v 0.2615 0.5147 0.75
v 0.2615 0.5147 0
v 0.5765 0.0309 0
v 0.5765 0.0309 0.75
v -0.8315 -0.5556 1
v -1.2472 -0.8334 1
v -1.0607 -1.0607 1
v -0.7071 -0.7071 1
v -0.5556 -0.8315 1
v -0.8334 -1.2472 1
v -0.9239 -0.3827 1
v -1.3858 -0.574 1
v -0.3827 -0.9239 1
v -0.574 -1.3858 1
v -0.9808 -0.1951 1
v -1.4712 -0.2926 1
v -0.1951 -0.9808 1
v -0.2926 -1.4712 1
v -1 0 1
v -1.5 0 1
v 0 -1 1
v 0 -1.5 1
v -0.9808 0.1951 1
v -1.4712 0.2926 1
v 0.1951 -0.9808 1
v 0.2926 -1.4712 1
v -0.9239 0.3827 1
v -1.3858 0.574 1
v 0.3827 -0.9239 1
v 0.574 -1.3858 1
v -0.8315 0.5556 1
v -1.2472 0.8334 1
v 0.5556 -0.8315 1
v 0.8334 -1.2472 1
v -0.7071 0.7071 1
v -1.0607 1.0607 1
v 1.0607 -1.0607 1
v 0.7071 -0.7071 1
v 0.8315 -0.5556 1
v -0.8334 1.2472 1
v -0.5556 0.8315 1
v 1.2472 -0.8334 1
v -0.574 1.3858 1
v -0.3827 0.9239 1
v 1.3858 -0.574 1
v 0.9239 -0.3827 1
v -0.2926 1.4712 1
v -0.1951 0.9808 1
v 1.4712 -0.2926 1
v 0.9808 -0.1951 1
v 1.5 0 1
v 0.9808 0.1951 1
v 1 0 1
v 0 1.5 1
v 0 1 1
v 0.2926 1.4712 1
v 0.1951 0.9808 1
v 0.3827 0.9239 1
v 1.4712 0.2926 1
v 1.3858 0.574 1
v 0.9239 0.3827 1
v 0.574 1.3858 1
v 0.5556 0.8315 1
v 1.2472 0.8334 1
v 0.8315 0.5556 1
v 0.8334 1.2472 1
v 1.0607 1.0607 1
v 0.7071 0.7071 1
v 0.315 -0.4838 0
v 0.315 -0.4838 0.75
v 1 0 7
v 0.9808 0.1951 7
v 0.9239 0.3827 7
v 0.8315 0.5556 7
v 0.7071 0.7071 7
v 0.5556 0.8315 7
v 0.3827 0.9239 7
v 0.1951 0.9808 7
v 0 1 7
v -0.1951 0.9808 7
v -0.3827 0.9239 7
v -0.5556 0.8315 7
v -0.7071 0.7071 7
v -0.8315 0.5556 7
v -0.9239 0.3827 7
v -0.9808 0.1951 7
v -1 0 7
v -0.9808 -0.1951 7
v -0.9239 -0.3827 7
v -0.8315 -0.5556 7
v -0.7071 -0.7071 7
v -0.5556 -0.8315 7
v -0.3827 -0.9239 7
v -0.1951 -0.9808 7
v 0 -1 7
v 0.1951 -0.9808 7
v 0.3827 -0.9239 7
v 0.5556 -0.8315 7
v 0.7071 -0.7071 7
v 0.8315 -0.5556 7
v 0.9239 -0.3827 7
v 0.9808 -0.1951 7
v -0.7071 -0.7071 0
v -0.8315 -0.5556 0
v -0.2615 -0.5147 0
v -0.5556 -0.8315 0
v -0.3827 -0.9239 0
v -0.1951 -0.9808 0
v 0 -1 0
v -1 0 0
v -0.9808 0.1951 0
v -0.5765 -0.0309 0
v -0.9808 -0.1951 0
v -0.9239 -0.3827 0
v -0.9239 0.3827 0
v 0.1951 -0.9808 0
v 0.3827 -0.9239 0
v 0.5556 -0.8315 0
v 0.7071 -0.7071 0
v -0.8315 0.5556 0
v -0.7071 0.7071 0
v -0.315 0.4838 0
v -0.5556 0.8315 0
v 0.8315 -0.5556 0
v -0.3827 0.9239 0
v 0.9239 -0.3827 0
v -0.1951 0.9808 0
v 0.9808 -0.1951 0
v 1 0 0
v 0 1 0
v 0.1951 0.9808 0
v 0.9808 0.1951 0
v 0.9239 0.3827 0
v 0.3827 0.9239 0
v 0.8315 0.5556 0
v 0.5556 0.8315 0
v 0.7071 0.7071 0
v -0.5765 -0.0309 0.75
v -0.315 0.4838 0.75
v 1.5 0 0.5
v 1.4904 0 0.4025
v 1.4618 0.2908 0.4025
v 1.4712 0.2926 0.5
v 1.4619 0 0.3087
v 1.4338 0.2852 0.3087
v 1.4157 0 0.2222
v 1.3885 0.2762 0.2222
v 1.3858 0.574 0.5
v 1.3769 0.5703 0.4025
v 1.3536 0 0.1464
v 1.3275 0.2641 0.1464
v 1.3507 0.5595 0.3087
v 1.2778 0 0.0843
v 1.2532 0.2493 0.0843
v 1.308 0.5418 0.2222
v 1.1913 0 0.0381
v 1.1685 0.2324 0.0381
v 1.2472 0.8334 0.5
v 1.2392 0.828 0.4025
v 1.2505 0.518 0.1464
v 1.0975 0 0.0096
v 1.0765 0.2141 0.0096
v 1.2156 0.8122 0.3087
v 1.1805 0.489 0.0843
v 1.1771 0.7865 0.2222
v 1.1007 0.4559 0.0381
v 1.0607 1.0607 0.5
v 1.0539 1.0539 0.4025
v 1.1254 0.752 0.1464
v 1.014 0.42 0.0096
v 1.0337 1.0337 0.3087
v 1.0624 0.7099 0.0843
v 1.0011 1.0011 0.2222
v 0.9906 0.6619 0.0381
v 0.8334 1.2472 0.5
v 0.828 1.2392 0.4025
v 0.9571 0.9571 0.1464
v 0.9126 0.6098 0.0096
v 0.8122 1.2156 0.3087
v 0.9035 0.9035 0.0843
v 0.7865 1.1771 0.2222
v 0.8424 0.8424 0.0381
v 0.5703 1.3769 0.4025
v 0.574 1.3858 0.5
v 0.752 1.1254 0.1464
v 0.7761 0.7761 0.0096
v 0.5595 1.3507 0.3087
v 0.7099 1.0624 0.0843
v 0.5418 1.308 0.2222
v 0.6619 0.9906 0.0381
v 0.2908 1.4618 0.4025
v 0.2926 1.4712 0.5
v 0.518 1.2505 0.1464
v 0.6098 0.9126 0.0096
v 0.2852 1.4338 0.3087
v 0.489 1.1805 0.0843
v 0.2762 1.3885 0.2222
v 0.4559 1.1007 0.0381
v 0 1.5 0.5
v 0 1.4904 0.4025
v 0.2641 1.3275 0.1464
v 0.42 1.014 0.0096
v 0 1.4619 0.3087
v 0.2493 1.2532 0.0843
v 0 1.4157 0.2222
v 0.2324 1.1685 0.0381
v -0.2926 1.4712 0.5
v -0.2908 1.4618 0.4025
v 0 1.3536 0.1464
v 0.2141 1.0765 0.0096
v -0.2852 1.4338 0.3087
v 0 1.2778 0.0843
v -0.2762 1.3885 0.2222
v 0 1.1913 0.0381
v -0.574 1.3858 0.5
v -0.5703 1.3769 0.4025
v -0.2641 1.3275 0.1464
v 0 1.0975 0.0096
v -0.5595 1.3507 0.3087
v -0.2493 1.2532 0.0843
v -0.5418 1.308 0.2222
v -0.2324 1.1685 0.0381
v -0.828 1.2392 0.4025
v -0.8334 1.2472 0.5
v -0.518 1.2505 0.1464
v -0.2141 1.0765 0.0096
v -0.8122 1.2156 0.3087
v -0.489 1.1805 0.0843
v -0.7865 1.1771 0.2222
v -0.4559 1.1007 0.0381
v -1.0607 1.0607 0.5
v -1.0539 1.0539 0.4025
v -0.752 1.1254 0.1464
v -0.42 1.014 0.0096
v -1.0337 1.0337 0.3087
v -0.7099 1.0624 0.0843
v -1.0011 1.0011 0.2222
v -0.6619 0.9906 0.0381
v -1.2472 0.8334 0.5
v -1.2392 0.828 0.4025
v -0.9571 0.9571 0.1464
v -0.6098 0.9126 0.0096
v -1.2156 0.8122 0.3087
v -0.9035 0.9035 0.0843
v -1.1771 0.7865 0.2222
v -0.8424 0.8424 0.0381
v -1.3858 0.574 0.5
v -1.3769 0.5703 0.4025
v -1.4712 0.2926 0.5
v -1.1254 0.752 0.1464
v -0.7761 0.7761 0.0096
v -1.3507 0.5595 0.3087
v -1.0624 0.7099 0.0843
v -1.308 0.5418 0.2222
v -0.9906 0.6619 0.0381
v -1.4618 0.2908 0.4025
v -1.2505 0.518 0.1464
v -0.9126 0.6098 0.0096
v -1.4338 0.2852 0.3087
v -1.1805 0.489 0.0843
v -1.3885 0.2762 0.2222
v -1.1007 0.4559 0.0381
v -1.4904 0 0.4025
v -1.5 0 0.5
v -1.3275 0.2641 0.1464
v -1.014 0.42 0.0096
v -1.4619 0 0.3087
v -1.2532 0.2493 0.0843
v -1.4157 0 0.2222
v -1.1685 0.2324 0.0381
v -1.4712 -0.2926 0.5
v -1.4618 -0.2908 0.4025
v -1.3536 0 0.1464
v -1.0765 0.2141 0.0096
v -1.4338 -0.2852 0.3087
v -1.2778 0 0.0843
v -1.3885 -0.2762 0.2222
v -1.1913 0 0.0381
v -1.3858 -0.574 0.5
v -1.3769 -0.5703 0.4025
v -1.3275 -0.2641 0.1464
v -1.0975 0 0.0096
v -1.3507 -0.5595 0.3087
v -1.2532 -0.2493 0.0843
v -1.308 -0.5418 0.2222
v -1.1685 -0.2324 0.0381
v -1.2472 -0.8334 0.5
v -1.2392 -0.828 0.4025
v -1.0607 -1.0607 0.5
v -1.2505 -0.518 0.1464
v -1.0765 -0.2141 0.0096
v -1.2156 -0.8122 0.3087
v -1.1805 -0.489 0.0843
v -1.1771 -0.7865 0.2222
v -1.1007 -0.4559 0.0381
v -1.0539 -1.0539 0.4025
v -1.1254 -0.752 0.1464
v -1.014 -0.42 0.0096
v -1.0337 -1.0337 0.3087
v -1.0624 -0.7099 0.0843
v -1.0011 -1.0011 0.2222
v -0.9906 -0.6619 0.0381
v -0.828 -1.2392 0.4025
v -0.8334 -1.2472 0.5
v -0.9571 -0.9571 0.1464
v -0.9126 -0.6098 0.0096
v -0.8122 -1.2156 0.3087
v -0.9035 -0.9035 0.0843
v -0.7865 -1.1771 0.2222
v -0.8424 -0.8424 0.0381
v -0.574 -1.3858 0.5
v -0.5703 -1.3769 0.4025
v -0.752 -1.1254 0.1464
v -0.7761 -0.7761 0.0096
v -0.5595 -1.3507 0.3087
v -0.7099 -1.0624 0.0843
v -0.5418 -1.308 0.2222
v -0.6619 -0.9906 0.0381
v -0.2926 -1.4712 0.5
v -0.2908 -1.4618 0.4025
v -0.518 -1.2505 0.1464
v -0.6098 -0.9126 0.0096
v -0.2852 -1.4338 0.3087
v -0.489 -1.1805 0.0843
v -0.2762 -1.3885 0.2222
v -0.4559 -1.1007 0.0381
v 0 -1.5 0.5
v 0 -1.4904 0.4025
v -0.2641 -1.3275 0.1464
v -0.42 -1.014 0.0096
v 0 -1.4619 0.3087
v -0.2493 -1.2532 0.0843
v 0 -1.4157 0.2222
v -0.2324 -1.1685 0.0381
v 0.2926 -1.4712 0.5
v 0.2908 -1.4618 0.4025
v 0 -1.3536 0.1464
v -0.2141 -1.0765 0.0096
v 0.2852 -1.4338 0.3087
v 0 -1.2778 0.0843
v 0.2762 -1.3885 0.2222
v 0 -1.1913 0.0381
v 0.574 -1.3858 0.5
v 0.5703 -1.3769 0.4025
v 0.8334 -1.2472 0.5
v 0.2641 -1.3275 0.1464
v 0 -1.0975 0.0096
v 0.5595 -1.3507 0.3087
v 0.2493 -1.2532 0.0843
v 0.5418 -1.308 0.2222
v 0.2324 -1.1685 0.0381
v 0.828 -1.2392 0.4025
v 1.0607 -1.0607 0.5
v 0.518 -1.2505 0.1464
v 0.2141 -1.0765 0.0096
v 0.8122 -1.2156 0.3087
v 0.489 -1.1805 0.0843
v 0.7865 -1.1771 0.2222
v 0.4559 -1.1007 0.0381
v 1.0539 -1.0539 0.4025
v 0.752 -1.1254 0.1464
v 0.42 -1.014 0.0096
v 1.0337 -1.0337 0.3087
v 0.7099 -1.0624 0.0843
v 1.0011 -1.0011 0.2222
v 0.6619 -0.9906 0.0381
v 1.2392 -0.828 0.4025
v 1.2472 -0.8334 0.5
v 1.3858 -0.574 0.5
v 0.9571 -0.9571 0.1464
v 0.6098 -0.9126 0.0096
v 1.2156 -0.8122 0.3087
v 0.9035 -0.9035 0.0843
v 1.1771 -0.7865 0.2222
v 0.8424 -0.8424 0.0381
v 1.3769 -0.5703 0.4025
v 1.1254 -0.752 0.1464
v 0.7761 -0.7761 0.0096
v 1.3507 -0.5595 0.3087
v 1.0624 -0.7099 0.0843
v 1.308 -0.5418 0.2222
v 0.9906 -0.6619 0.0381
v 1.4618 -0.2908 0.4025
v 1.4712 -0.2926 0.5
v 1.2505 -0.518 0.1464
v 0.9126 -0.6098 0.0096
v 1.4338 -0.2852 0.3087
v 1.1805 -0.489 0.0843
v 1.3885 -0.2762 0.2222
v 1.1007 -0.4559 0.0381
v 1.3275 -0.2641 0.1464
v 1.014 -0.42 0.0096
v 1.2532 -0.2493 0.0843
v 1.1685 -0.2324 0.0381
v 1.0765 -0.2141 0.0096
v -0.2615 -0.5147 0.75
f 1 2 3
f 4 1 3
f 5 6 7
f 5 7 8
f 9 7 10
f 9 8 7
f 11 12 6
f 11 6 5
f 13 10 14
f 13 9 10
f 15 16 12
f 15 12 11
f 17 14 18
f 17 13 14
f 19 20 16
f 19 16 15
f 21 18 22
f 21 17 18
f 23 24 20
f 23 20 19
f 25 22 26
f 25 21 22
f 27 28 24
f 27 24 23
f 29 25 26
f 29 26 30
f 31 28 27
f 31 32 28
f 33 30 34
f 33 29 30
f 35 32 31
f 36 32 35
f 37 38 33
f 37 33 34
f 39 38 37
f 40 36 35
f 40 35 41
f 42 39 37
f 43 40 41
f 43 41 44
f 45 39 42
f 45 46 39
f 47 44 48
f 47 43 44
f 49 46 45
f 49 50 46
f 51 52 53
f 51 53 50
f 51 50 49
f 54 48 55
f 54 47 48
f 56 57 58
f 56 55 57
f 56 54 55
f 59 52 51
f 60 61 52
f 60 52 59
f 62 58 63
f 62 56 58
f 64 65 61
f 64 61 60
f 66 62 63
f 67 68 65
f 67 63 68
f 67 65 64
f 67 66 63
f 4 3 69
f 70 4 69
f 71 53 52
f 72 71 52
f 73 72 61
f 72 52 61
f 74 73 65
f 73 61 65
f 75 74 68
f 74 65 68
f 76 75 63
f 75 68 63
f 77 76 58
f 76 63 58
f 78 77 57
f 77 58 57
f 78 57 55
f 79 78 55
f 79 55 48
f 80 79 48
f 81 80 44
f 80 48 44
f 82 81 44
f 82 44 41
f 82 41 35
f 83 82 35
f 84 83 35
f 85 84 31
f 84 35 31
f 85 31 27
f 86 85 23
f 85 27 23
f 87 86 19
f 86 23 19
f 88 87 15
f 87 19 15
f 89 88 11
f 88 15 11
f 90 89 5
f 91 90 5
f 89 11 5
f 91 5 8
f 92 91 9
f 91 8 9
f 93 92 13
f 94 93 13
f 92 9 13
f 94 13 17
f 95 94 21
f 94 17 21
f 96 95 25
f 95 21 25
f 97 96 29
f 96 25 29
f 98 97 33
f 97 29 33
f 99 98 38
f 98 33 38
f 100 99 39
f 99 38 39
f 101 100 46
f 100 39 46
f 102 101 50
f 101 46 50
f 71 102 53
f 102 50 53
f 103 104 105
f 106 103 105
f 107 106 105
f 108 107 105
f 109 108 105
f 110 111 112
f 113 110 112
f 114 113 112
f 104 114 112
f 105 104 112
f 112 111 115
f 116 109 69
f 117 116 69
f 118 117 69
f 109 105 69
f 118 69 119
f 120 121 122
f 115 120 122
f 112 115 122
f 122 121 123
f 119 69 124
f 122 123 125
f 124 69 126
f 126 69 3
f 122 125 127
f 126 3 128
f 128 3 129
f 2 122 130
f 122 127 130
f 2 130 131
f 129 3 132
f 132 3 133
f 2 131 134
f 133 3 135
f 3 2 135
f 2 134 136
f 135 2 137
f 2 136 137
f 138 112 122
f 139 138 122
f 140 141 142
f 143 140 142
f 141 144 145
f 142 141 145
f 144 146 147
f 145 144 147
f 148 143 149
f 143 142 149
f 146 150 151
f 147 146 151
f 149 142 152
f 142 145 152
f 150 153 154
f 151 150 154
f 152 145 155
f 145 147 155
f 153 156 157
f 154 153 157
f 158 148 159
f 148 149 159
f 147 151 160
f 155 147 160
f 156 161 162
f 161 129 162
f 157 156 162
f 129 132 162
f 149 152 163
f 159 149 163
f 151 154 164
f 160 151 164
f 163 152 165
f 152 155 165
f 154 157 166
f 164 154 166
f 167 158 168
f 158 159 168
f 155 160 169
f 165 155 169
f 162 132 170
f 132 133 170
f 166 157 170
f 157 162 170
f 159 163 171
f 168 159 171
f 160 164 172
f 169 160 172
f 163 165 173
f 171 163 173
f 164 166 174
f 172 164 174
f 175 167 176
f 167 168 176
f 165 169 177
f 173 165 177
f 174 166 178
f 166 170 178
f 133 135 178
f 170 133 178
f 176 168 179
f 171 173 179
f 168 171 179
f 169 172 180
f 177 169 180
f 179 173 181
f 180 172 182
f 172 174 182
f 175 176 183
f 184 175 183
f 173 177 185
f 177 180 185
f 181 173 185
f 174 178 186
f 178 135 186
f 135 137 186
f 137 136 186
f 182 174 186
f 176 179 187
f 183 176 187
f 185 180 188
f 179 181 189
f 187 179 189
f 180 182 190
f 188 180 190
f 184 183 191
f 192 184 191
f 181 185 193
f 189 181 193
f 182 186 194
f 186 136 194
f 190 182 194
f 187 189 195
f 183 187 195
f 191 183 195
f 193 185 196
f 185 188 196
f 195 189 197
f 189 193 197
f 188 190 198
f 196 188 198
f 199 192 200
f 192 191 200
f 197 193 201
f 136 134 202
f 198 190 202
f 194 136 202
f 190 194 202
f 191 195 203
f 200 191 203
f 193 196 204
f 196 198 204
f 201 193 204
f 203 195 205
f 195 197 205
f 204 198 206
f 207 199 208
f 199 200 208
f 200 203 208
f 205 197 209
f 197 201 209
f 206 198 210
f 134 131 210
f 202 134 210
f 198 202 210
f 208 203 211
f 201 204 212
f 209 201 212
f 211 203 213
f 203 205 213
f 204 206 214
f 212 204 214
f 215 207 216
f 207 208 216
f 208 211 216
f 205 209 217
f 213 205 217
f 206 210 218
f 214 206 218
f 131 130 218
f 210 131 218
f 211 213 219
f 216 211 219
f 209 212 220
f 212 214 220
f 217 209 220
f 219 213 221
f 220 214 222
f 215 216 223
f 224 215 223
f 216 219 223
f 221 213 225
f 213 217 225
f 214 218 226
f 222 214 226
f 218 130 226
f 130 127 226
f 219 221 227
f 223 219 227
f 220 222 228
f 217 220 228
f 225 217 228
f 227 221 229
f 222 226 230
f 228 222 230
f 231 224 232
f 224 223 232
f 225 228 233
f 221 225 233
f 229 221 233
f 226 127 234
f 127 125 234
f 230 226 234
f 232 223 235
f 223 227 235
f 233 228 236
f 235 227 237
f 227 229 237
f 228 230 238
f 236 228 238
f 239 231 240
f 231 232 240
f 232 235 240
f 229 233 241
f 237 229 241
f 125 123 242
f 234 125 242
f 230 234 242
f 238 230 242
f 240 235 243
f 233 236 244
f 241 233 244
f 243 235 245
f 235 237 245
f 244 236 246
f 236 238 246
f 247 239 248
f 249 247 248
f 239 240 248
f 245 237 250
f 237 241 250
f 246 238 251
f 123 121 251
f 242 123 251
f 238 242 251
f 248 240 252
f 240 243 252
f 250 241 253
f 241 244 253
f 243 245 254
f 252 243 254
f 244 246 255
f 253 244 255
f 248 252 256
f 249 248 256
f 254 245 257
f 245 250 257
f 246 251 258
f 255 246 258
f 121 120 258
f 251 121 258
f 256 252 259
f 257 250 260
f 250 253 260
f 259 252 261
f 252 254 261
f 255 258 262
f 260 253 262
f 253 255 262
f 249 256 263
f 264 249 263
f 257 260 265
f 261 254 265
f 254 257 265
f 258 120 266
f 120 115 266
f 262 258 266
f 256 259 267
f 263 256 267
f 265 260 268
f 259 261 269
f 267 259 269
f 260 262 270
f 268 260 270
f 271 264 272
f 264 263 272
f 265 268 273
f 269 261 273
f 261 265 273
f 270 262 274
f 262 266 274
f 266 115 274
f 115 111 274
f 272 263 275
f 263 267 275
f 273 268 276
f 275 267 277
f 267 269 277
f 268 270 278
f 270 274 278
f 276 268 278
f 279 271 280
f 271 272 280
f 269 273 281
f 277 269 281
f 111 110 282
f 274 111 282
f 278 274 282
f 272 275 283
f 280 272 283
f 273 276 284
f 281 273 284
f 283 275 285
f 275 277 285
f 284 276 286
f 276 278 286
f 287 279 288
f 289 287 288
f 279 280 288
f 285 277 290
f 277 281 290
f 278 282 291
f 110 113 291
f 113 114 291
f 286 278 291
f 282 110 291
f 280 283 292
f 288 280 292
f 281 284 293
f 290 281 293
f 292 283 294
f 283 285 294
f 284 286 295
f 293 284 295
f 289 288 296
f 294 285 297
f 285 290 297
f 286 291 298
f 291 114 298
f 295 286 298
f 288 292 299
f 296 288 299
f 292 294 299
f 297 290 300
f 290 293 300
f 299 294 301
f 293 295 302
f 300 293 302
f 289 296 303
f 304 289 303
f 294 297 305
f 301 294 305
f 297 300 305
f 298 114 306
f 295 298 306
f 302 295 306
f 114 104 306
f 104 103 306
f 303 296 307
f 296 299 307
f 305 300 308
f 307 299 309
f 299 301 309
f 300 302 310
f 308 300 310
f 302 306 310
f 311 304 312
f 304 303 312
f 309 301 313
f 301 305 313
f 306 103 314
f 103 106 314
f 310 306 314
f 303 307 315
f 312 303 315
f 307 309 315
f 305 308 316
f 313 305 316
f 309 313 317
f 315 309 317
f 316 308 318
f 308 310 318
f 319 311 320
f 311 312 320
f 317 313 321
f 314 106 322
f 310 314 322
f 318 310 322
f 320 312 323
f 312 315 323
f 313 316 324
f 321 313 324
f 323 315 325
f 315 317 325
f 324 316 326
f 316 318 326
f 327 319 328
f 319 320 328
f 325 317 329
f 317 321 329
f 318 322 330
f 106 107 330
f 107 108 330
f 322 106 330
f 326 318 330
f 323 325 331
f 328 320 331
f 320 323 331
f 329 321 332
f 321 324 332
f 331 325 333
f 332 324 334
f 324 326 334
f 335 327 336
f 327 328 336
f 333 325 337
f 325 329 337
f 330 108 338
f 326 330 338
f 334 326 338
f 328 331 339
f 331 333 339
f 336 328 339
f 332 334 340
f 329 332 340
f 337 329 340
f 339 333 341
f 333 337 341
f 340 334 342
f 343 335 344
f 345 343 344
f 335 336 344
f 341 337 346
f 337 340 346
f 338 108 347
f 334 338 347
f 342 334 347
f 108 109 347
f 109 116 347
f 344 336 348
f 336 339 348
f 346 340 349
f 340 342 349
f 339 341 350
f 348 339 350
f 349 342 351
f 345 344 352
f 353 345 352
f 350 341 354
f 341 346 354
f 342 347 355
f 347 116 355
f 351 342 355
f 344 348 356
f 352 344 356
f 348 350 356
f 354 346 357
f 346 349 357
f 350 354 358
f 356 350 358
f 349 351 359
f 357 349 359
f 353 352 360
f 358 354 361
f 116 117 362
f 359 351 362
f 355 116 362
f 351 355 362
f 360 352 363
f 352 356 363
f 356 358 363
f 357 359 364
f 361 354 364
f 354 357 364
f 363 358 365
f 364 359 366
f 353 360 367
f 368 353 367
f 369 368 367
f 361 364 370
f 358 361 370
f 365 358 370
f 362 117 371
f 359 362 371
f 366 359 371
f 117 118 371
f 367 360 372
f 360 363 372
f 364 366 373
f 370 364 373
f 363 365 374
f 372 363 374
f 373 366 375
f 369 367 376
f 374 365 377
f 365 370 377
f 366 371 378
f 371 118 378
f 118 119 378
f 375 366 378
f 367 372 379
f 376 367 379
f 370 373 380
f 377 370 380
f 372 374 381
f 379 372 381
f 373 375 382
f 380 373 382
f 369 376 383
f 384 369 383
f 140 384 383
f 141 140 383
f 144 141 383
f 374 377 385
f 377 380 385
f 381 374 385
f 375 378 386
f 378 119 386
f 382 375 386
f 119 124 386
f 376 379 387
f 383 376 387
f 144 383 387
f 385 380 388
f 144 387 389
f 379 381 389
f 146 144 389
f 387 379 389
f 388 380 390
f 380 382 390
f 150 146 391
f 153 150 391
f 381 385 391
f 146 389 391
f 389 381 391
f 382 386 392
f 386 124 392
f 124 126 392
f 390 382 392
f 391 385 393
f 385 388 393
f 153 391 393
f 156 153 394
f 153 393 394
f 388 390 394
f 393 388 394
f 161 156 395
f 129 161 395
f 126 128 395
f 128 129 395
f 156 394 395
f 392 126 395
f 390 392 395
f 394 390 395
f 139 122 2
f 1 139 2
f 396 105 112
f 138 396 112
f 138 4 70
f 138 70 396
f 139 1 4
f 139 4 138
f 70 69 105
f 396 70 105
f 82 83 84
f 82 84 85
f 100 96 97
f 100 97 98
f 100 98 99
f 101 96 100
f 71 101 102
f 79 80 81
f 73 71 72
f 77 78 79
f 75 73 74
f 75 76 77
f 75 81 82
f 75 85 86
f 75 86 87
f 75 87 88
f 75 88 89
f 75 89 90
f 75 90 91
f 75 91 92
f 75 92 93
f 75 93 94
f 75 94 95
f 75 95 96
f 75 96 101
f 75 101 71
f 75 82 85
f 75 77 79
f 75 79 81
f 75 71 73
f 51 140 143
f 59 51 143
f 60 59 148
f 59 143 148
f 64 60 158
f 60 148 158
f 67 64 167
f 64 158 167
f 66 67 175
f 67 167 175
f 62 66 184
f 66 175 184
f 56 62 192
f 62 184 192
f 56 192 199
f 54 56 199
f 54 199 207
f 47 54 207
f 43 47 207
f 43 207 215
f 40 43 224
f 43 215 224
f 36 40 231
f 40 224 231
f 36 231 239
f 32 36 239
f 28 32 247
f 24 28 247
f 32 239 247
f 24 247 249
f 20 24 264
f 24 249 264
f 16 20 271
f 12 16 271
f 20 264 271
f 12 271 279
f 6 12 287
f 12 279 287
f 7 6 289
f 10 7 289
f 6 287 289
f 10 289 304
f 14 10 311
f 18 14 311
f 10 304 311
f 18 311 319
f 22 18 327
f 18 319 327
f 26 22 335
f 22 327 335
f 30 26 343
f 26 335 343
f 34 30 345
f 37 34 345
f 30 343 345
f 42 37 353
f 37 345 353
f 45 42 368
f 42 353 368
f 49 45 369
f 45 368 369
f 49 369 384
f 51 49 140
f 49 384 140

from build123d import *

# Parameters (mm, degrees)
SKETCH1_R           = 1.5
BOSS_EXTRUDE1_DEPTH = 1
SKETCH2_R           = 1
BOSS_EXTRUDE2_DEPTH = 6
CUT_EXTRUDE1_DEPTH  = 0.75
FILLET1_R           = 0.5


with BuildPart() as part:
    # Sketch1 → Boss-Extrude1 (new body)
    with BuildSketch(Plane.XY):
        Circle(SKETCH1_R)
    extrude(amount=BOSS_EXTRUDE1_DEPTH)

    # Sketch2 → Boss-Extrude2 (add)
    with BuildSketch(Plane.XY.offset(1)):
        Circle(SKETCH2_R)
    extrude(amount=BOSS_EXTRUDE2_DEPTH)

    # Sketch3 → Cut-Extrude1 (cut)
    with BuildSketch(Plane(origin=(0, 0, 0), x_dir=(-1, 0, 0), z_dir=(0, 0, -1))):
        Polygon((0.261487369, -0.51474041), (0.576521955, -0.030915501), (0.315034587, 0.483824909), (-0.261487369, 0.51474041), (-0.576521955, 0.030915501), (-0.315034587, -0.483824909), align=None)
    extrude(amount=-CUT_EXTRUDE1_DEPTH, mode=Mode.SUBTRACT)

    # Fillet1
    fillet1_edges = [part.edges().sort_by_distance(p)[0] for p in [
        (-1.5, 0, 0),
    ]]
    fillet(fillet1_edges, radius=FILLET1_R)


solid = part.part
